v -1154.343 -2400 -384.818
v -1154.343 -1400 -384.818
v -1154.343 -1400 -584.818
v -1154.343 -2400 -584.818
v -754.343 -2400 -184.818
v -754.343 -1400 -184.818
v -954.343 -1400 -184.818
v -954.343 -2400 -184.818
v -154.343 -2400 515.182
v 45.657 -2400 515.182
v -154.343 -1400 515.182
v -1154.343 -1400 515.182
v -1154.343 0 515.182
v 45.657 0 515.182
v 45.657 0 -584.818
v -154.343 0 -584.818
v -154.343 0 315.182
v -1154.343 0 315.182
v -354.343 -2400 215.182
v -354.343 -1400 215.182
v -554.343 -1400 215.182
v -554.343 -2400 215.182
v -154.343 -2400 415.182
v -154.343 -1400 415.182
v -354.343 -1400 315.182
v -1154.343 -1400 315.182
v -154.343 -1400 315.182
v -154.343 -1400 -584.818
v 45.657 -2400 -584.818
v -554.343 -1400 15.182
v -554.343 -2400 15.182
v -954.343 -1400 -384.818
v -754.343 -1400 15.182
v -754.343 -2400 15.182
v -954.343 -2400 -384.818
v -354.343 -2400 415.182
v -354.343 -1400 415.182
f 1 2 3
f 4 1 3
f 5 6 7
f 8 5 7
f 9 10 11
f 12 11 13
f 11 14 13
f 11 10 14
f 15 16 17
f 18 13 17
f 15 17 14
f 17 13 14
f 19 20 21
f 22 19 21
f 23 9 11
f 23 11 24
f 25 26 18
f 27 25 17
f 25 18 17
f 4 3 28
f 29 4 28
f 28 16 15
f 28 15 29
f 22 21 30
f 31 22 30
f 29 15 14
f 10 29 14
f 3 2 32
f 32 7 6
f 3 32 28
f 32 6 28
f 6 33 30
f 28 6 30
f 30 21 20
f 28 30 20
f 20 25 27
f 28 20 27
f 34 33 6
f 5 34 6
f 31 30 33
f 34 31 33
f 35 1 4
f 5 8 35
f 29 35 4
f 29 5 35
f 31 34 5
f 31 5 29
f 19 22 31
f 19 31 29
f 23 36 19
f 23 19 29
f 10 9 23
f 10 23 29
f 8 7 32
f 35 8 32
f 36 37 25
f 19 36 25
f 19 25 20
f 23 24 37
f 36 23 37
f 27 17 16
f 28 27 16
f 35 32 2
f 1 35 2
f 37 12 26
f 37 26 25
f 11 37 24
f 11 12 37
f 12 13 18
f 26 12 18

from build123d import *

# Parameters (mm, degrees)
F1_DEPTH = 2400
F2_W     = 1000
F2_H     = 200
F3_DEPTH = 1000
F5_DEPTH = 1000


with BuildPart() as f1:
    # F0 (on Front) → F1 (new body)
    with BuildSketch(Plane.XZ):
        Polygon((-1154.342916, 315.182347), (-154.342916, 315.182347), (-154.342916, -584.817653), (45.657084, -584.817653), (45.657084, 515.182347), (-1154.342916, 515.182347), align=None)
    extrude(amount=F1_DEPTH)

    # F2 (on face) → F3 (cut)
    with BuildSketch(Plane.XZ.offset(2400)):
        with Locations((-654.342916, 415.182347)):
            Rectangle(F2_W, F2_H)
    extrude(amount=-F3_DEPTH, mode=Mode.SUBTRACT)

    # F4 (on face) → F5 (join)
    with BuildSketch(Plane.XZ.offset(1400)):
        Polygon((-954.342916, -384.817653), (-1154.342916, -384.817653), (-1154.342916, -584.817653), (-154.342916, -584.817653), (-154.342916, 415.182347), (-354.342916, 415.182347), (-354.342916, 215.182347), (-554.342916, 215.182347), (-554.342916, 15.182347), (-754.342916, 15.182347), (-754.342916, -184.817653), (-954.342916, -184.817653), align=None)
    extrude(amount=F5_DEPTH)


solid = f1.part
